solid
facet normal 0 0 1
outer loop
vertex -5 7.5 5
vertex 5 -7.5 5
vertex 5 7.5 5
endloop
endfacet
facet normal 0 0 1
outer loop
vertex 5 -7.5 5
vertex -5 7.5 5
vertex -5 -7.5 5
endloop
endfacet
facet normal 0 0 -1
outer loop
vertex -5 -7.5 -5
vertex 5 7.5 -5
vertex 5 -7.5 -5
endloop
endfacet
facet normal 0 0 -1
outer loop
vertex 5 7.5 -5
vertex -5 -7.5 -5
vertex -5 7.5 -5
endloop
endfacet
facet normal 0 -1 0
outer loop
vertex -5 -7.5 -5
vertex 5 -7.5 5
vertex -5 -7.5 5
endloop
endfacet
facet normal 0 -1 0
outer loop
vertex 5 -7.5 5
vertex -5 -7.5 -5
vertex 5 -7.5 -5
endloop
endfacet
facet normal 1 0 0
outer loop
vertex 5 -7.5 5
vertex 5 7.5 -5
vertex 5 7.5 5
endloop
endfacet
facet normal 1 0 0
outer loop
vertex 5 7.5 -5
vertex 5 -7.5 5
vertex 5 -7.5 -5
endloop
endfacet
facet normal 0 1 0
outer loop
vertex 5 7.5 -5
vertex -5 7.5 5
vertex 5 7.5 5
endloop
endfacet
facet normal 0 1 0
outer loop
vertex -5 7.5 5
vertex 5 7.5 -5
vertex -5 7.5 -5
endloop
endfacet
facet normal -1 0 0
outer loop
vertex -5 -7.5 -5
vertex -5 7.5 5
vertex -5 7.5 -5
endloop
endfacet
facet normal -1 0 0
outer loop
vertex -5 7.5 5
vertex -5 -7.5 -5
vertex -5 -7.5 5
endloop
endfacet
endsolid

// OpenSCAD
// Generated by generate_scads.py
cube(size=[10,15,10], center=true);
